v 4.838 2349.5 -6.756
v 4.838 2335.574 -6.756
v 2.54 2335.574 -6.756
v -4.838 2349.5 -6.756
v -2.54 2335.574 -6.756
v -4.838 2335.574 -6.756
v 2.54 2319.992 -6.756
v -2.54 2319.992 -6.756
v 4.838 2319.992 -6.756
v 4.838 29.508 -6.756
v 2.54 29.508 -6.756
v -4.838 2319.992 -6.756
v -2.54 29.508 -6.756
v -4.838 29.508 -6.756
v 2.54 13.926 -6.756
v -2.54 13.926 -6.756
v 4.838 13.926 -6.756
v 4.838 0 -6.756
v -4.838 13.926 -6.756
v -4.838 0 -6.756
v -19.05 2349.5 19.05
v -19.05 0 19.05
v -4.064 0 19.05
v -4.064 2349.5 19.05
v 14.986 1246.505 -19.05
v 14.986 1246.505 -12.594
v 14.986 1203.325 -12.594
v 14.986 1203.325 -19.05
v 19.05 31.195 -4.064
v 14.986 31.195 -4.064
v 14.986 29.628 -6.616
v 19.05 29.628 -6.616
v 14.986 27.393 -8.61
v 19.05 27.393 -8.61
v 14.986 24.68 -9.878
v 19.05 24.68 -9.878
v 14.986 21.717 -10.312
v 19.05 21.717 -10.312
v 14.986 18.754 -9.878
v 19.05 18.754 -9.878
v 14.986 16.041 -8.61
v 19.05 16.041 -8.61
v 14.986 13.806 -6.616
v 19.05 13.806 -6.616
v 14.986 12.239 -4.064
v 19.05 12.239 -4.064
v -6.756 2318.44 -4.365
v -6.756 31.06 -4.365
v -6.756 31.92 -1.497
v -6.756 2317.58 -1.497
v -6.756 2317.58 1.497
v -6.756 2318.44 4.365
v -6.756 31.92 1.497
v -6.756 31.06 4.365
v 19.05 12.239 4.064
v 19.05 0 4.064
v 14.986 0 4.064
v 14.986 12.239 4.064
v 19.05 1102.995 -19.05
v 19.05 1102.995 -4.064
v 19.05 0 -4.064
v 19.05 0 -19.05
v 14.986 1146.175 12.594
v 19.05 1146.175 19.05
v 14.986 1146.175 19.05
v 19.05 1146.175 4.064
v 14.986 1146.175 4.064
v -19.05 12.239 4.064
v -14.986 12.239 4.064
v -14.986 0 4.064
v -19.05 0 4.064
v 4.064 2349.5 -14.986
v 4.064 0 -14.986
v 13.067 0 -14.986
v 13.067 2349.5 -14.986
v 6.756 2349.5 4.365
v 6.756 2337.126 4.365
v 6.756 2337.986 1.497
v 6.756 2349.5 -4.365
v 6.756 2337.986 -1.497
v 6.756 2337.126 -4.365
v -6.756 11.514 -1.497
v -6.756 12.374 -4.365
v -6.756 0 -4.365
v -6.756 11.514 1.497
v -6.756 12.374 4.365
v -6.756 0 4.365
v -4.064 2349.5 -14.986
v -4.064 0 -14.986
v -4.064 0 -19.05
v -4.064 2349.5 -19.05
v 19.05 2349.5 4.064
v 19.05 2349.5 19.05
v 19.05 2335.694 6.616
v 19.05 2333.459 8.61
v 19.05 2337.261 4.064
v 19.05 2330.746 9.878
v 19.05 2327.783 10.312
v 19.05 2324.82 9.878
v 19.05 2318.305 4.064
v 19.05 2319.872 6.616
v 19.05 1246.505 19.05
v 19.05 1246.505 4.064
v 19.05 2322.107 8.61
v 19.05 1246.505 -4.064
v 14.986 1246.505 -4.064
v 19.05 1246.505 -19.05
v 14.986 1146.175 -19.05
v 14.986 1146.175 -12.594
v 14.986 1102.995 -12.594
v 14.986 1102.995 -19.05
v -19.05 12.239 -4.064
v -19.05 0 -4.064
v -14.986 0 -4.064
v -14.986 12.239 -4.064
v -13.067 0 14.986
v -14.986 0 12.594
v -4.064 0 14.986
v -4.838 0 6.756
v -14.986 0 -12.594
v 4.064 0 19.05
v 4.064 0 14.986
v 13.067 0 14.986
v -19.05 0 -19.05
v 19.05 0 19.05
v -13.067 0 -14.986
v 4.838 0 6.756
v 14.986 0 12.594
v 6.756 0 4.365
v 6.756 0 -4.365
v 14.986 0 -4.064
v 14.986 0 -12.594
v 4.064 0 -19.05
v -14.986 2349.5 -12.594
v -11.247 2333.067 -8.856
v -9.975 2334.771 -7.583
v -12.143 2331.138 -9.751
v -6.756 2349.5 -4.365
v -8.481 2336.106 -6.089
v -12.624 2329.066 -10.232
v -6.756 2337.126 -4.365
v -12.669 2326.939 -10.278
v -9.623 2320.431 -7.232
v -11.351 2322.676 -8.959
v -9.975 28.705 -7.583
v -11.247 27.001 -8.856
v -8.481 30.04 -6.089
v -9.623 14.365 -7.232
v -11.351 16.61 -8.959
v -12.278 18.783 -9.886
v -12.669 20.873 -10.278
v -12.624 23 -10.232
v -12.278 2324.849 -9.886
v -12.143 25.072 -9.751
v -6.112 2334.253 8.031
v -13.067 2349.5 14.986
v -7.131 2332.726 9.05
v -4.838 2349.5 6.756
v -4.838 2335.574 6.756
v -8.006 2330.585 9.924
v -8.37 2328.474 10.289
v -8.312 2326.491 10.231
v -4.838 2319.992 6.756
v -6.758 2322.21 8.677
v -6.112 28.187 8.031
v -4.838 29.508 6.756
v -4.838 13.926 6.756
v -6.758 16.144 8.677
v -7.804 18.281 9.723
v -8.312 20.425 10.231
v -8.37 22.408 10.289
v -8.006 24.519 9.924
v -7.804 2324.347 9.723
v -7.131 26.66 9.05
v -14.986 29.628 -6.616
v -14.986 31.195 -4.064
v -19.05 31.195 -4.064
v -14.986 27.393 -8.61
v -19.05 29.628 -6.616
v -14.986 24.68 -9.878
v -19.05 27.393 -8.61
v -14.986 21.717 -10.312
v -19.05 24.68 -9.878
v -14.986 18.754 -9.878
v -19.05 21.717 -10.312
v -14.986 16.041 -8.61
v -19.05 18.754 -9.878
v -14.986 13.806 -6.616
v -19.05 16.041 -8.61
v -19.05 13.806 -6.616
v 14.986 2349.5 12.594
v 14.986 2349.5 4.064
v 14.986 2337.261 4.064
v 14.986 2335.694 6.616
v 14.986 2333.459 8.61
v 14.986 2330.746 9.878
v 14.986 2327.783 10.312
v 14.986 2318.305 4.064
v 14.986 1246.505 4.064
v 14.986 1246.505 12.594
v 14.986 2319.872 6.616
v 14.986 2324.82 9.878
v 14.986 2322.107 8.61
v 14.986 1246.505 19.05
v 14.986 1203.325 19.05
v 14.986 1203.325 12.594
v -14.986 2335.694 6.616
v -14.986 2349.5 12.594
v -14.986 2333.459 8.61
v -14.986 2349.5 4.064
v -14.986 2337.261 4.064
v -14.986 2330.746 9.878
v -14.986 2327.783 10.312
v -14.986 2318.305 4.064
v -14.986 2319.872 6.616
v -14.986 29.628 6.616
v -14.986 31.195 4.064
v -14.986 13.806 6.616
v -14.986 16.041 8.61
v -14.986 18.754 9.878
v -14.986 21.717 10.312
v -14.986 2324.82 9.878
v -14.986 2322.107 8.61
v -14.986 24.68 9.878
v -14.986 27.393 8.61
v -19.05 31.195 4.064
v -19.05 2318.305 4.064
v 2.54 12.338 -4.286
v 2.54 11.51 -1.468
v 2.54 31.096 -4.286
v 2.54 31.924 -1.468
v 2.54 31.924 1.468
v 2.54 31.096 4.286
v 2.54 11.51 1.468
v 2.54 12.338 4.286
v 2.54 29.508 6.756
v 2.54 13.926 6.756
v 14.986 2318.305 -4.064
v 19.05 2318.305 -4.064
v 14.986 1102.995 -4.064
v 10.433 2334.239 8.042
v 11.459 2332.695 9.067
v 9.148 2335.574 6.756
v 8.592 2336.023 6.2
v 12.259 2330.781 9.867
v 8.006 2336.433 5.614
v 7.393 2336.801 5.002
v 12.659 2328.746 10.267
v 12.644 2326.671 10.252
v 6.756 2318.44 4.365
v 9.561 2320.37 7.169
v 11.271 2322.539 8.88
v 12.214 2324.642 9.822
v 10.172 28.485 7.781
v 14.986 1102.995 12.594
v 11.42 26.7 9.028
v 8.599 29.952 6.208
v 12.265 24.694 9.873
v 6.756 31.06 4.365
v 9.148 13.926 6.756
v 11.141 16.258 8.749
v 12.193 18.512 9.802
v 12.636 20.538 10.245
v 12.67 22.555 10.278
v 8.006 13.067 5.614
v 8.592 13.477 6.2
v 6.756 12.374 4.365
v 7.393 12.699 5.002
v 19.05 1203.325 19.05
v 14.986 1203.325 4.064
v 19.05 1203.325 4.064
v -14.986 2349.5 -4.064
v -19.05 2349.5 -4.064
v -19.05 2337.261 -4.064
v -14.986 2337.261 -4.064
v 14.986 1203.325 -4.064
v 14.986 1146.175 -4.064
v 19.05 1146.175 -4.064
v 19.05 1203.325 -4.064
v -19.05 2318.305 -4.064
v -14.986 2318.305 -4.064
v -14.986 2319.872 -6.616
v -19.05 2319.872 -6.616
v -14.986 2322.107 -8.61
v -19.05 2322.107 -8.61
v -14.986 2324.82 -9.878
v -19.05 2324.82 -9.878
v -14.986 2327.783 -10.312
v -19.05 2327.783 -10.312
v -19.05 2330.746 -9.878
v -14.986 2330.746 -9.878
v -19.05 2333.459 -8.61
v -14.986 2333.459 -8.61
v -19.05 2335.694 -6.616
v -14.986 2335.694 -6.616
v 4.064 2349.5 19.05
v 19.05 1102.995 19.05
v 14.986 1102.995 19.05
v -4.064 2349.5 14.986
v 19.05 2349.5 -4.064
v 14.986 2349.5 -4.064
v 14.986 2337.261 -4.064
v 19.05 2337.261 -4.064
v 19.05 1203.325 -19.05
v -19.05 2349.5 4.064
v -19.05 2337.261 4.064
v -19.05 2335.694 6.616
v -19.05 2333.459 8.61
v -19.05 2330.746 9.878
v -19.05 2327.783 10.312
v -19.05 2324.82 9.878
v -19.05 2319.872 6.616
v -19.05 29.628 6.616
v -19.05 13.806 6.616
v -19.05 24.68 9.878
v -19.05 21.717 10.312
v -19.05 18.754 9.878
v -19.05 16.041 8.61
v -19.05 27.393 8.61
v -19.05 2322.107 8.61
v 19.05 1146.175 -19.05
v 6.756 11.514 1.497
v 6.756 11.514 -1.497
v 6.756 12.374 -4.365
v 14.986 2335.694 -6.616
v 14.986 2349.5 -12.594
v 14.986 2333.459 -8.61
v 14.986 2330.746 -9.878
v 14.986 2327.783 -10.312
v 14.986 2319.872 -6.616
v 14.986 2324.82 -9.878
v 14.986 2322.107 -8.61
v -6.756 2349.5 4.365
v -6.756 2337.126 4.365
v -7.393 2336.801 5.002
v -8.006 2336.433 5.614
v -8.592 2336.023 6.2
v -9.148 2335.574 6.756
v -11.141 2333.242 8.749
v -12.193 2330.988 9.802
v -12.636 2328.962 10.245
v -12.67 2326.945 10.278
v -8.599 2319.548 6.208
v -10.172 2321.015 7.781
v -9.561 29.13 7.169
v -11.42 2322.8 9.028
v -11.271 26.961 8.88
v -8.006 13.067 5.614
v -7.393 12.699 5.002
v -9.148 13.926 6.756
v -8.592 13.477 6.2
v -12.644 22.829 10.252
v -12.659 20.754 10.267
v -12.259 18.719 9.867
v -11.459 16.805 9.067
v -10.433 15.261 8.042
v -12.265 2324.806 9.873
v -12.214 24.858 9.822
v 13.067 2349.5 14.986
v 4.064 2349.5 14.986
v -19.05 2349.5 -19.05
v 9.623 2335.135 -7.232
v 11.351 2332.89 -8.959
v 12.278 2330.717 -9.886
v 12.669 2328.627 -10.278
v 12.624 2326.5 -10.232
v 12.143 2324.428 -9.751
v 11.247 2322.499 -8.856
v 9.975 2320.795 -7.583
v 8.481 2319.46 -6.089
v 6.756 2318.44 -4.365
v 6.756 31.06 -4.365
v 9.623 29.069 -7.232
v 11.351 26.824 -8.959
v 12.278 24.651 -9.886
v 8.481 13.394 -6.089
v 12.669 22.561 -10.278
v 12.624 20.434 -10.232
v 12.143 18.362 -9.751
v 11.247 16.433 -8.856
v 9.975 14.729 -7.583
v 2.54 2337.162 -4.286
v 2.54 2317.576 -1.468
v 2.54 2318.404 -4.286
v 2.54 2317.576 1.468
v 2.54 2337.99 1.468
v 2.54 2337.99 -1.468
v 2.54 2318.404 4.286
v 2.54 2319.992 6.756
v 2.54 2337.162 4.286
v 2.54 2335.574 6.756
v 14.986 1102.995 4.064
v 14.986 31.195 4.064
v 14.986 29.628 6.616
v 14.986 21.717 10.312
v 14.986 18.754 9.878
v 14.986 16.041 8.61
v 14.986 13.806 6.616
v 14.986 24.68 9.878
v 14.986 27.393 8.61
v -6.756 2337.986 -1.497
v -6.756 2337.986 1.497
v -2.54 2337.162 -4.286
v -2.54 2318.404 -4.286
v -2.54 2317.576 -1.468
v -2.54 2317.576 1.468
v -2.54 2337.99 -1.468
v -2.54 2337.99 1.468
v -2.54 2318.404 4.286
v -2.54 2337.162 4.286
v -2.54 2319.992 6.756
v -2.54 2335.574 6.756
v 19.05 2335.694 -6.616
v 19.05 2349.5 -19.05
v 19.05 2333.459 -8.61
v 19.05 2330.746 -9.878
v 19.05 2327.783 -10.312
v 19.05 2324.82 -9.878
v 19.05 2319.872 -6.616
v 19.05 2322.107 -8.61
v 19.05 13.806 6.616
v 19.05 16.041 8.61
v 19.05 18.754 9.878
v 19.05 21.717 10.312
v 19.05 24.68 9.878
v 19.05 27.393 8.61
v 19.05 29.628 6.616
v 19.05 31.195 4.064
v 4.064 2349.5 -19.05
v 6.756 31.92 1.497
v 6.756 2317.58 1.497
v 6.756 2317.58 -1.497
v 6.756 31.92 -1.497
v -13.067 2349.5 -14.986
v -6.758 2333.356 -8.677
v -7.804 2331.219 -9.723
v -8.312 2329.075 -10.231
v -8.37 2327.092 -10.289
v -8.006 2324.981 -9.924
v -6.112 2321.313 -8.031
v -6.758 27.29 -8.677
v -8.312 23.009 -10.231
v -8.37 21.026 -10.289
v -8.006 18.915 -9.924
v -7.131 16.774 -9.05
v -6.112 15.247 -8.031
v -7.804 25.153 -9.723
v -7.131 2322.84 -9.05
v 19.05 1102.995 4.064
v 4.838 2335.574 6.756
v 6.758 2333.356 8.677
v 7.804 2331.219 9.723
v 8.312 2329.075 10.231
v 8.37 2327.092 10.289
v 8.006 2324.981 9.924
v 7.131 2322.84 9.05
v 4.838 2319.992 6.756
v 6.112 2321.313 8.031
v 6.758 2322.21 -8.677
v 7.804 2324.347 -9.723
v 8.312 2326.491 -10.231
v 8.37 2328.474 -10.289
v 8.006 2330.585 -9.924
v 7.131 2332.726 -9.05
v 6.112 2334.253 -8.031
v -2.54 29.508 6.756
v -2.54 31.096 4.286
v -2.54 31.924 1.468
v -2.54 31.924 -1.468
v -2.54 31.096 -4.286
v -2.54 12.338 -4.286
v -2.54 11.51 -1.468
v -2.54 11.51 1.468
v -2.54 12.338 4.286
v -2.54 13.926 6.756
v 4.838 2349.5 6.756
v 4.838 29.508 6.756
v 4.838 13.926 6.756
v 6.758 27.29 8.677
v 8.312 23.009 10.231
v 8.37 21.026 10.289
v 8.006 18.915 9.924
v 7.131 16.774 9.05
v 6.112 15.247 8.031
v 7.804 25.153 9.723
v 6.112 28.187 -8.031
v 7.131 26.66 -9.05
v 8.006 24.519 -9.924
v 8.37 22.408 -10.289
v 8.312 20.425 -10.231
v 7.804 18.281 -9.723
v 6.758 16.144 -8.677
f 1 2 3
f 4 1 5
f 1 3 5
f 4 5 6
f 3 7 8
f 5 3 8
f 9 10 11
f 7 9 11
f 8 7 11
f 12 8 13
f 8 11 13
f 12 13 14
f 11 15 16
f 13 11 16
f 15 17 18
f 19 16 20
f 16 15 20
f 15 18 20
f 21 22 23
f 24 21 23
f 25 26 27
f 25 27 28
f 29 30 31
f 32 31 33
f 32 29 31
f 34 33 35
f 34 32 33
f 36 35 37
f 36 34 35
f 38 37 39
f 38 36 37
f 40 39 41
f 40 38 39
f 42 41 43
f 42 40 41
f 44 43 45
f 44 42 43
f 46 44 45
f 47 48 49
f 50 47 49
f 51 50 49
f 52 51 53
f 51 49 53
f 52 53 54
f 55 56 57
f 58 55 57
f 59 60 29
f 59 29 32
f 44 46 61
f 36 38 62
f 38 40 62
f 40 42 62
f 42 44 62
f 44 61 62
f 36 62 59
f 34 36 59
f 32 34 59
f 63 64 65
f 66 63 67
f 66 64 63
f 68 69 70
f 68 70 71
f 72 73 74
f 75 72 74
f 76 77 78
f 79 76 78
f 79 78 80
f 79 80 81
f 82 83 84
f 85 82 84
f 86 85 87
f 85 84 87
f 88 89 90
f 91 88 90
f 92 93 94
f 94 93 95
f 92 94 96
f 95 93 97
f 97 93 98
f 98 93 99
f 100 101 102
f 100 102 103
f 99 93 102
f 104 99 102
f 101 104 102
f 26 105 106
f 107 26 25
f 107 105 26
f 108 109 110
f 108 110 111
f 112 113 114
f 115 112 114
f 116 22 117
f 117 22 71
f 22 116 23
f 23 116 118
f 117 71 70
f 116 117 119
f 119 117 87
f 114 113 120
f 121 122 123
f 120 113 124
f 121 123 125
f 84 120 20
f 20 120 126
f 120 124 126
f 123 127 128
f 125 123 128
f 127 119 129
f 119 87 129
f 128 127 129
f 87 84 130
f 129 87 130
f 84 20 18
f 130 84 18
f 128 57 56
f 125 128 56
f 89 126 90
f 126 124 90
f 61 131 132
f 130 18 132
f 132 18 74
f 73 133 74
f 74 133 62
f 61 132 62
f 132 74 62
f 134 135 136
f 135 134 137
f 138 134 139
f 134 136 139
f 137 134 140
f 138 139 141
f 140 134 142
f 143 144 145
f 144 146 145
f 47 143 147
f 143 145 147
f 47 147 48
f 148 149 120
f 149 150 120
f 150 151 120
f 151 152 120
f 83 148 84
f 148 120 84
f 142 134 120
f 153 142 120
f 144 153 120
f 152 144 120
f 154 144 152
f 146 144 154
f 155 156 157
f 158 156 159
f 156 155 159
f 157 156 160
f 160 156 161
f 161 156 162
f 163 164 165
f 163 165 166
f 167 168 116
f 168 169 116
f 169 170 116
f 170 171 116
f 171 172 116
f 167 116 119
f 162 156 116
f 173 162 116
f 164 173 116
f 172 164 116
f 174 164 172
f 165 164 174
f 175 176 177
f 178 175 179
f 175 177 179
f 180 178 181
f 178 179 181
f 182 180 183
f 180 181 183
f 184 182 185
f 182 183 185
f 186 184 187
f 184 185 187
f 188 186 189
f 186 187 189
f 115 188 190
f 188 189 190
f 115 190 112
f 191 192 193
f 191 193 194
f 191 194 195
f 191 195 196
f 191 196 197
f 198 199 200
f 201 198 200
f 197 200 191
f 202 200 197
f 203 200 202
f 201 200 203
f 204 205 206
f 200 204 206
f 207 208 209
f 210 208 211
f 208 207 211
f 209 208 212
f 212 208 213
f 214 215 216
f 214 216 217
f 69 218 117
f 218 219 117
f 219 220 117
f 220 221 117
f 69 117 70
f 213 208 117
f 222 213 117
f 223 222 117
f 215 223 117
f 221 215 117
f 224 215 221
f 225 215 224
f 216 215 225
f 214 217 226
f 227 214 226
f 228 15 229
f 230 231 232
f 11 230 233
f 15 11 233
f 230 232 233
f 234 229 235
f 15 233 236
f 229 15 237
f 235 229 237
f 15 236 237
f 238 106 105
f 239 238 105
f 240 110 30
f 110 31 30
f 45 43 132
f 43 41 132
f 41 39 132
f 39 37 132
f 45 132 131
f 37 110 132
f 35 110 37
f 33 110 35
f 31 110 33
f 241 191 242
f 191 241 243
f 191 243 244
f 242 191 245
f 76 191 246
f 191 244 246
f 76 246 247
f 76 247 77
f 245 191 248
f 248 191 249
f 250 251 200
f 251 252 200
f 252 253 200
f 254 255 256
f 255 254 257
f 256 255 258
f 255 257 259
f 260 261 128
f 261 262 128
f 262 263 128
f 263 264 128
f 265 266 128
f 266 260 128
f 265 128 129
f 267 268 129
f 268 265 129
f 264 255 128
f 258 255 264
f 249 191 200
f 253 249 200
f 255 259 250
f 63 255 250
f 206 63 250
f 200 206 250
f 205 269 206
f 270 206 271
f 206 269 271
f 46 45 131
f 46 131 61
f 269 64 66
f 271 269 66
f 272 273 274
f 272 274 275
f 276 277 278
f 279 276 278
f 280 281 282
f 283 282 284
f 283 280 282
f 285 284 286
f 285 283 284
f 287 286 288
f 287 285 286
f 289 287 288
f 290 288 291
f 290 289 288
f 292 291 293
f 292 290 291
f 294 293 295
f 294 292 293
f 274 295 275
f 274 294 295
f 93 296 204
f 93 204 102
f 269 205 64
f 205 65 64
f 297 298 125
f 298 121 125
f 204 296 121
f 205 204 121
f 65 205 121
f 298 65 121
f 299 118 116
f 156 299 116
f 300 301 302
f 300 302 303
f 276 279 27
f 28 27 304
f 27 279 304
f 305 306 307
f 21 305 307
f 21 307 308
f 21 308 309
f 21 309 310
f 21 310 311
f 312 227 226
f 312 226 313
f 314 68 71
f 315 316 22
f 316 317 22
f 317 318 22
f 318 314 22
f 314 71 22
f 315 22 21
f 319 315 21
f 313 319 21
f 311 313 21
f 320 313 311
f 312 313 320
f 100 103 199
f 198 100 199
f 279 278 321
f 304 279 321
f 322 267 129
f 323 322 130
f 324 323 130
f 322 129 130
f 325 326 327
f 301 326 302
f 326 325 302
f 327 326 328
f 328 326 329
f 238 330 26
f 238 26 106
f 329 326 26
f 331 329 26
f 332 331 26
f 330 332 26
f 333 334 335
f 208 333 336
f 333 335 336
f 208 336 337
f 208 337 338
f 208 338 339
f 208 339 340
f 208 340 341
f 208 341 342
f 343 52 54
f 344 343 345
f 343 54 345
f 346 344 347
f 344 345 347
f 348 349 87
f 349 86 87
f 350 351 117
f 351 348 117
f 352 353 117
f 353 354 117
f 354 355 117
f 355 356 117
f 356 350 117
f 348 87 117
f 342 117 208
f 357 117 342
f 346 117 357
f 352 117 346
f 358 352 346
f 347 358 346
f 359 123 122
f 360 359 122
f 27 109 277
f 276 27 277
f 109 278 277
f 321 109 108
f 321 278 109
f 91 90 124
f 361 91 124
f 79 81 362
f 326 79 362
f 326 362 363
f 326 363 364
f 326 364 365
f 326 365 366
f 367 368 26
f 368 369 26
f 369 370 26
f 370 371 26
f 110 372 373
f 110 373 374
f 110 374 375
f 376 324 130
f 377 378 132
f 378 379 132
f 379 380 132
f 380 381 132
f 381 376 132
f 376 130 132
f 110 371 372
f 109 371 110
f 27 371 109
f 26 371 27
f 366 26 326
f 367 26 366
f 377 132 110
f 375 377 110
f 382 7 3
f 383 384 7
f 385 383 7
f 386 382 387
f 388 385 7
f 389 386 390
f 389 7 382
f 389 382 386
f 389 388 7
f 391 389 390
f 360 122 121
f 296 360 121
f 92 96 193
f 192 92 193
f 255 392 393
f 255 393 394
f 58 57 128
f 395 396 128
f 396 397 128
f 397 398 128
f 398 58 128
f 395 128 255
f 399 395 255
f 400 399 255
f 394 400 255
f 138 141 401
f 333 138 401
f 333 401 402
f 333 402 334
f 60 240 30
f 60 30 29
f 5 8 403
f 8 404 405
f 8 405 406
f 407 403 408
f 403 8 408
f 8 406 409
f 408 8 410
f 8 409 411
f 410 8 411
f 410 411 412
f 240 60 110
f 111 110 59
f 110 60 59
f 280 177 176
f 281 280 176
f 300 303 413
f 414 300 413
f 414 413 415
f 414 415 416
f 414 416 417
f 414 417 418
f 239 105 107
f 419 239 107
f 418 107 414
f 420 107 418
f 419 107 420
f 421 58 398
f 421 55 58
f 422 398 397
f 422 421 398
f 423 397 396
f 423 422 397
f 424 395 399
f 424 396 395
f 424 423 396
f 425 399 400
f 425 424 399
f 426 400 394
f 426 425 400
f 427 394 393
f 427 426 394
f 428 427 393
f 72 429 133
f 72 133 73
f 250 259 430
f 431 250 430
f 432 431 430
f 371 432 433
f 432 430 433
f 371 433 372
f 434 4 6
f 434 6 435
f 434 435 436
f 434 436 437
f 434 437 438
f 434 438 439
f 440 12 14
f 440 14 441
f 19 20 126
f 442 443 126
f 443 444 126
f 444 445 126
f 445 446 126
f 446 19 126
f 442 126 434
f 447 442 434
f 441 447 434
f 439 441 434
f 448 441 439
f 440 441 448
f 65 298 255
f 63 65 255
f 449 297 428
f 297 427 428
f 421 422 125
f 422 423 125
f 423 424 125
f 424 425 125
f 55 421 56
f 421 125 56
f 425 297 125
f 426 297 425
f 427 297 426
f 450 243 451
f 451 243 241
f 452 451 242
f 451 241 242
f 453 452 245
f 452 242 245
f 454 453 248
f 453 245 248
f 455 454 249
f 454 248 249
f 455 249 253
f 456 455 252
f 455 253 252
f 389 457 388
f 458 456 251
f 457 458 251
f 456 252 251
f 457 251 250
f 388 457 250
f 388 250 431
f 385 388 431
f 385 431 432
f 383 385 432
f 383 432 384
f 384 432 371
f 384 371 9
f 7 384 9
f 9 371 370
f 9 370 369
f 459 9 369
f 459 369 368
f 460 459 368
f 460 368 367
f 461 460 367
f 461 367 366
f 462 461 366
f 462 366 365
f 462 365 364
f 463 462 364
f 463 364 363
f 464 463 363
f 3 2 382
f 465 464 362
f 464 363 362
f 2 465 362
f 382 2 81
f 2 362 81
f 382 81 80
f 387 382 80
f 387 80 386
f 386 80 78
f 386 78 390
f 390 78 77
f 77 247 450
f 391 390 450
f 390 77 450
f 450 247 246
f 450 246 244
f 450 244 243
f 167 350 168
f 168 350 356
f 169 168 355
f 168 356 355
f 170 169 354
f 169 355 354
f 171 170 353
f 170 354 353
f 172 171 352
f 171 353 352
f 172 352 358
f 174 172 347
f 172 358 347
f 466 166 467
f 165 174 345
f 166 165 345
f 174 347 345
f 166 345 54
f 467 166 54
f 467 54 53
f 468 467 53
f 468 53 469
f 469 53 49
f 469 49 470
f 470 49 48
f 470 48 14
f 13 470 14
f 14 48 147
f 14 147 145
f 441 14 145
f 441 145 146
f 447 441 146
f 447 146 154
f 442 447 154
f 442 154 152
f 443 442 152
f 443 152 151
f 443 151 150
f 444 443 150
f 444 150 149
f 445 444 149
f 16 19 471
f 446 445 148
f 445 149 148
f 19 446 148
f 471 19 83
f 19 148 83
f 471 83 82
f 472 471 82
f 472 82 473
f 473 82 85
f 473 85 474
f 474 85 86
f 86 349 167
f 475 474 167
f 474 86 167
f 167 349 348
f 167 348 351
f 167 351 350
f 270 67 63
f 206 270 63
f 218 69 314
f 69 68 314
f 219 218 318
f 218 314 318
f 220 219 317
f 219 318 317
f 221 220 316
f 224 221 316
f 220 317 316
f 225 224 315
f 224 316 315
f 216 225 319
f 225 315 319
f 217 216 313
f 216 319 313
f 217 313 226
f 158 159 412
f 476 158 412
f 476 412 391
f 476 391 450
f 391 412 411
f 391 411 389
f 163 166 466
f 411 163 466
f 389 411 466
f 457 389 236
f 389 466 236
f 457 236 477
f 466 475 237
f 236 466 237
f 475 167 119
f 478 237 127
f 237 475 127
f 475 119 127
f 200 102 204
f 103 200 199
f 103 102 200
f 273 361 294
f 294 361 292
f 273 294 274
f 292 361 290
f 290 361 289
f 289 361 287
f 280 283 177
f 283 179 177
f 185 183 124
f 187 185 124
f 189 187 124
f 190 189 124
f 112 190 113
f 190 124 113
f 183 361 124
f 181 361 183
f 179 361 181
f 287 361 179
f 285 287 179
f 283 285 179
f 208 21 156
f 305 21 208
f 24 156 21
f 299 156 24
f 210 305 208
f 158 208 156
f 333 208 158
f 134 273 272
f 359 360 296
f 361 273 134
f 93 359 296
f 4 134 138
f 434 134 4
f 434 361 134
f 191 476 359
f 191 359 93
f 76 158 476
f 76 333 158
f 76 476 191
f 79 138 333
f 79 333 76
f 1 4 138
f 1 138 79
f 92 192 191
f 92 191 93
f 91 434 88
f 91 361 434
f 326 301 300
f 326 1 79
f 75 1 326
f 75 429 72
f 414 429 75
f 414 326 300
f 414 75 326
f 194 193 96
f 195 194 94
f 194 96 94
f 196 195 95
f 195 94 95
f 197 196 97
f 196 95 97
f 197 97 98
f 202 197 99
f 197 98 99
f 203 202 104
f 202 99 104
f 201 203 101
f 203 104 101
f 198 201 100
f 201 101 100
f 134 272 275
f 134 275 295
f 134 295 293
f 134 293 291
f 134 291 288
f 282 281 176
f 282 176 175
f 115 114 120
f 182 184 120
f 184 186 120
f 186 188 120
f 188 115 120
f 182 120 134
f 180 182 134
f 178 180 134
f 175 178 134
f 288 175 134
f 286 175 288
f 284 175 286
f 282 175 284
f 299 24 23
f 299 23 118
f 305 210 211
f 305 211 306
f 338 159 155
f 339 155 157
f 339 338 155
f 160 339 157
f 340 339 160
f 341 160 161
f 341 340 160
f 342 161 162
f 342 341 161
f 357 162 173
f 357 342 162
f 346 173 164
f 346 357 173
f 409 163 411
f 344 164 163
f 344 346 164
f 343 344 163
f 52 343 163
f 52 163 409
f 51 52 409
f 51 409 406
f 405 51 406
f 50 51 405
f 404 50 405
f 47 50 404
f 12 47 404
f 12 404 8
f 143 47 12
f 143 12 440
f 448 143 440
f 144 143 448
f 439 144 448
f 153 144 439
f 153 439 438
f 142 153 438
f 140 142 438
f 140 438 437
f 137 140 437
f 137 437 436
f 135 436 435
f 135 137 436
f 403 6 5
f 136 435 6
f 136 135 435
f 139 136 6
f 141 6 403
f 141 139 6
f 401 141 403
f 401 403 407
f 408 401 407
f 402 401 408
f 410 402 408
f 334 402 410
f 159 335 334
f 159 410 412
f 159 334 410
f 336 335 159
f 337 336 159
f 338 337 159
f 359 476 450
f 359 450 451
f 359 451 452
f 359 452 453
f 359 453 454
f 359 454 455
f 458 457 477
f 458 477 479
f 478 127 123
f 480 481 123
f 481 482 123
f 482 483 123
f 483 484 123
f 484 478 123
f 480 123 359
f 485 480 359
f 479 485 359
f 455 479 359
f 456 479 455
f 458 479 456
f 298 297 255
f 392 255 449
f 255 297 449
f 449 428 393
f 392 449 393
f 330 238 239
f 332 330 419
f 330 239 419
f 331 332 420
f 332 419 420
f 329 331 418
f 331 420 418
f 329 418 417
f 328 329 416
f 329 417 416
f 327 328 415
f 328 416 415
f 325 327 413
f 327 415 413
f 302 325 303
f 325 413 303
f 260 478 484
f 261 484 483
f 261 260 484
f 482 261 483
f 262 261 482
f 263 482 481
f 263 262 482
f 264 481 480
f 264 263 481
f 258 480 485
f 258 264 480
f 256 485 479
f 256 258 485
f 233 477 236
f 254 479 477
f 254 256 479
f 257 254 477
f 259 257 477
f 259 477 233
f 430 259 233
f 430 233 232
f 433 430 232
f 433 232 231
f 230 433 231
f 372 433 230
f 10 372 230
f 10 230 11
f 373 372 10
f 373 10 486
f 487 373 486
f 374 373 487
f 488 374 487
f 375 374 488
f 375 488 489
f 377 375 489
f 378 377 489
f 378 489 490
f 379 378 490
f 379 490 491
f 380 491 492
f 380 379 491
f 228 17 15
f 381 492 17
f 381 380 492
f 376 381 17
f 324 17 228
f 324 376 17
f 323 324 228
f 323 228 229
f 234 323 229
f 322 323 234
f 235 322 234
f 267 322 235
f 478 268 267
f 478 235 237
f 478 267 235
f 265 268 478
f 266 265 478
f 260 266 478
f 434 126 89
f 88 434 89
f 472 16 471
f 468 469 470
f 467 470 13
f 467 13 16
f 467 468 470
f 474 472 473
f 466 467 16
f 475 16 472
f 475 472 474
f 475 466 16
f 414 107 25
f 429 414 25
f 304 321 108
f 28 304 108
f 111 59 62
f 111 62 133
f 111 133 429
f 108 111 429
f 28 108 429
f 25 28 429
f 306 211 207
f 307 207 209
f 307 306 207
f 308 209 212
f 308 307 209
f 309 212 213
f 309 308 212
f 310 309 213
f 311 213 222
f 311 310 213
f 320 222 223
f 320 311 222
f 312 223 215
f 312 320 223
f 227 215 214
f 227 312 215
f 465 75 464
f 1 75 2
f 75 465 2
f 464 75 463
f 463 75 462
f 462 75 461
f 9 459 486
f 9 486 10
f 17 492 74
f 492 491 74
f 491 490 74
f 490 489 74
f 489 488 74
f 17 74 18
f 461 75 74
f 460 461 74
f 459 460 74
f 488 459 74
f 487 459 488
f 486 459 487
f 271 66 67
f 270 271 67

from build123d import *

# Parameters (mm, degrees)
EXTRUDE1_DEPTH          = 2349.5
SKETCH2_W               = 127
SKETCH2_H               = 43.18
EXTRUDE2_DEPTH          = 4.064
SKETCH3_R               = 10.3124
CUT_EXTRUDE1_DEPTH      = 16.51
MIRROR2_COPY_1_SKETCH_R = 10.3124
MIRROR2_COPY_1_DEPTH    = 16.51


# Read off the part's stored shape, not the designer's step: 1515<1>
with BuildPart() as part:
    # Sketch1<2> → Extrude1 (new body)
    with BuildSketch(Plane(origin=(0, 0, 0), x_dir=(1, 0, 0), z_dir=(0, 1, 0))):
        Polygon((-6.7564, 4.364749804), (-6.7564, -4.364749804), (-14.986, -12.594349804), (-14.986, -4.064), (-19.05, -4.064), (-19.05, -19.05), (-4.064, -19.05), (-4.064, -14.986), (-13.067127258, -14.986), (-4.837527258, -6.7564), (4.837527258, -6.7564), (13.067127258, -14.986), (4.064, -14.986), (4.064, -19.05), (19.05, -19.05), (19.05, -4.064), (14.986, -4.064), (14.986, -12.594349804), (6.7564, -4.364749804), (6.7564, 4.364749804), (14.986, 12.594349804), (14.986, 4.064), (19.05, 4.064), (19.05, 19.05), (4.064, 19.05), (4.064, 14.986), (13.067127258, 14.986), (4.837527258, 6.7564), (-4.837527258, 6.7564), (-13.067127258, 14.986), (-4.064, 14.986), (-4.064, 19.05), (-19.05, 19.05), (-19.05, 4.064), (-14.986, 4.064), (-14.986, 12.594349804), align=None)
    extrude(amount=EXTRUDE1_DEPTH)

    # Sketch2 → Extrude2 (cut)
    with BuildSketch(Plane(origin=(19.05, 0, 0), x_dir=(0, 0, -1), z_dir=(1, 0, 0))):
        with Locations((0, 1224.915)):
            Rectangle(SKETCH2_W, SKETCH2_H)
        with Locations((0, 1124.585)):
            Rectangle(SKETCH2_W, SKETCH2_H)
    extrude(amount=-EXTRUDE2_DEPTH, mode=Mode.SUBTRACT)

    # Sketch3 → Cut-Extrude1 (cut)
    with BuildSketch(Plane.ZY.offset(19.05)):
        with Locations(Location((0, 21.717, 0), (0, 0, 310.932724574))):
            Circle(SKETCH3_R)
    cut_extrude1 = extrude(amount=-CUT_EXTRUDE1_DEPTH, mode=Mode.SUBTRACT)

    # Mirror1: Cut-Extrude1 across plane
    add(cut_extrude1.mirror(Plane(origin=(0, 0, 0), x_dir=(0, 0, 1), z_dir=(1, 0, 0))), mode=Mode.SUBTRACT)

    # Mirror2: Cut-Extrude1 across plane
    add(cut_extrude1.mirror(Plane(origin=(0, 1174.75, 0), x_dir=(0, 0, 1), z_dir=(0, -1, 0))), mode=Mode.SUBTRACT)

    # Mirror2 copy 1 sketch → Mirror2 copy 1 (cut)
    with BuildSketch(Plane(origin=(19.05, 2349.5, 0), x_dir=(0, 0, 1), z_dir=(1, 0, 0))):
        with Locations(Location((0, 21.717, 0), (0, 0, 310.932724574))):
            Circle(MIRROR2_COPY_1_SKETCH_R)
    extrude(amount=-MIRROR2_COPY_1_DEPTH, mode=Mode.SUBTRACT)


solid = part.part
